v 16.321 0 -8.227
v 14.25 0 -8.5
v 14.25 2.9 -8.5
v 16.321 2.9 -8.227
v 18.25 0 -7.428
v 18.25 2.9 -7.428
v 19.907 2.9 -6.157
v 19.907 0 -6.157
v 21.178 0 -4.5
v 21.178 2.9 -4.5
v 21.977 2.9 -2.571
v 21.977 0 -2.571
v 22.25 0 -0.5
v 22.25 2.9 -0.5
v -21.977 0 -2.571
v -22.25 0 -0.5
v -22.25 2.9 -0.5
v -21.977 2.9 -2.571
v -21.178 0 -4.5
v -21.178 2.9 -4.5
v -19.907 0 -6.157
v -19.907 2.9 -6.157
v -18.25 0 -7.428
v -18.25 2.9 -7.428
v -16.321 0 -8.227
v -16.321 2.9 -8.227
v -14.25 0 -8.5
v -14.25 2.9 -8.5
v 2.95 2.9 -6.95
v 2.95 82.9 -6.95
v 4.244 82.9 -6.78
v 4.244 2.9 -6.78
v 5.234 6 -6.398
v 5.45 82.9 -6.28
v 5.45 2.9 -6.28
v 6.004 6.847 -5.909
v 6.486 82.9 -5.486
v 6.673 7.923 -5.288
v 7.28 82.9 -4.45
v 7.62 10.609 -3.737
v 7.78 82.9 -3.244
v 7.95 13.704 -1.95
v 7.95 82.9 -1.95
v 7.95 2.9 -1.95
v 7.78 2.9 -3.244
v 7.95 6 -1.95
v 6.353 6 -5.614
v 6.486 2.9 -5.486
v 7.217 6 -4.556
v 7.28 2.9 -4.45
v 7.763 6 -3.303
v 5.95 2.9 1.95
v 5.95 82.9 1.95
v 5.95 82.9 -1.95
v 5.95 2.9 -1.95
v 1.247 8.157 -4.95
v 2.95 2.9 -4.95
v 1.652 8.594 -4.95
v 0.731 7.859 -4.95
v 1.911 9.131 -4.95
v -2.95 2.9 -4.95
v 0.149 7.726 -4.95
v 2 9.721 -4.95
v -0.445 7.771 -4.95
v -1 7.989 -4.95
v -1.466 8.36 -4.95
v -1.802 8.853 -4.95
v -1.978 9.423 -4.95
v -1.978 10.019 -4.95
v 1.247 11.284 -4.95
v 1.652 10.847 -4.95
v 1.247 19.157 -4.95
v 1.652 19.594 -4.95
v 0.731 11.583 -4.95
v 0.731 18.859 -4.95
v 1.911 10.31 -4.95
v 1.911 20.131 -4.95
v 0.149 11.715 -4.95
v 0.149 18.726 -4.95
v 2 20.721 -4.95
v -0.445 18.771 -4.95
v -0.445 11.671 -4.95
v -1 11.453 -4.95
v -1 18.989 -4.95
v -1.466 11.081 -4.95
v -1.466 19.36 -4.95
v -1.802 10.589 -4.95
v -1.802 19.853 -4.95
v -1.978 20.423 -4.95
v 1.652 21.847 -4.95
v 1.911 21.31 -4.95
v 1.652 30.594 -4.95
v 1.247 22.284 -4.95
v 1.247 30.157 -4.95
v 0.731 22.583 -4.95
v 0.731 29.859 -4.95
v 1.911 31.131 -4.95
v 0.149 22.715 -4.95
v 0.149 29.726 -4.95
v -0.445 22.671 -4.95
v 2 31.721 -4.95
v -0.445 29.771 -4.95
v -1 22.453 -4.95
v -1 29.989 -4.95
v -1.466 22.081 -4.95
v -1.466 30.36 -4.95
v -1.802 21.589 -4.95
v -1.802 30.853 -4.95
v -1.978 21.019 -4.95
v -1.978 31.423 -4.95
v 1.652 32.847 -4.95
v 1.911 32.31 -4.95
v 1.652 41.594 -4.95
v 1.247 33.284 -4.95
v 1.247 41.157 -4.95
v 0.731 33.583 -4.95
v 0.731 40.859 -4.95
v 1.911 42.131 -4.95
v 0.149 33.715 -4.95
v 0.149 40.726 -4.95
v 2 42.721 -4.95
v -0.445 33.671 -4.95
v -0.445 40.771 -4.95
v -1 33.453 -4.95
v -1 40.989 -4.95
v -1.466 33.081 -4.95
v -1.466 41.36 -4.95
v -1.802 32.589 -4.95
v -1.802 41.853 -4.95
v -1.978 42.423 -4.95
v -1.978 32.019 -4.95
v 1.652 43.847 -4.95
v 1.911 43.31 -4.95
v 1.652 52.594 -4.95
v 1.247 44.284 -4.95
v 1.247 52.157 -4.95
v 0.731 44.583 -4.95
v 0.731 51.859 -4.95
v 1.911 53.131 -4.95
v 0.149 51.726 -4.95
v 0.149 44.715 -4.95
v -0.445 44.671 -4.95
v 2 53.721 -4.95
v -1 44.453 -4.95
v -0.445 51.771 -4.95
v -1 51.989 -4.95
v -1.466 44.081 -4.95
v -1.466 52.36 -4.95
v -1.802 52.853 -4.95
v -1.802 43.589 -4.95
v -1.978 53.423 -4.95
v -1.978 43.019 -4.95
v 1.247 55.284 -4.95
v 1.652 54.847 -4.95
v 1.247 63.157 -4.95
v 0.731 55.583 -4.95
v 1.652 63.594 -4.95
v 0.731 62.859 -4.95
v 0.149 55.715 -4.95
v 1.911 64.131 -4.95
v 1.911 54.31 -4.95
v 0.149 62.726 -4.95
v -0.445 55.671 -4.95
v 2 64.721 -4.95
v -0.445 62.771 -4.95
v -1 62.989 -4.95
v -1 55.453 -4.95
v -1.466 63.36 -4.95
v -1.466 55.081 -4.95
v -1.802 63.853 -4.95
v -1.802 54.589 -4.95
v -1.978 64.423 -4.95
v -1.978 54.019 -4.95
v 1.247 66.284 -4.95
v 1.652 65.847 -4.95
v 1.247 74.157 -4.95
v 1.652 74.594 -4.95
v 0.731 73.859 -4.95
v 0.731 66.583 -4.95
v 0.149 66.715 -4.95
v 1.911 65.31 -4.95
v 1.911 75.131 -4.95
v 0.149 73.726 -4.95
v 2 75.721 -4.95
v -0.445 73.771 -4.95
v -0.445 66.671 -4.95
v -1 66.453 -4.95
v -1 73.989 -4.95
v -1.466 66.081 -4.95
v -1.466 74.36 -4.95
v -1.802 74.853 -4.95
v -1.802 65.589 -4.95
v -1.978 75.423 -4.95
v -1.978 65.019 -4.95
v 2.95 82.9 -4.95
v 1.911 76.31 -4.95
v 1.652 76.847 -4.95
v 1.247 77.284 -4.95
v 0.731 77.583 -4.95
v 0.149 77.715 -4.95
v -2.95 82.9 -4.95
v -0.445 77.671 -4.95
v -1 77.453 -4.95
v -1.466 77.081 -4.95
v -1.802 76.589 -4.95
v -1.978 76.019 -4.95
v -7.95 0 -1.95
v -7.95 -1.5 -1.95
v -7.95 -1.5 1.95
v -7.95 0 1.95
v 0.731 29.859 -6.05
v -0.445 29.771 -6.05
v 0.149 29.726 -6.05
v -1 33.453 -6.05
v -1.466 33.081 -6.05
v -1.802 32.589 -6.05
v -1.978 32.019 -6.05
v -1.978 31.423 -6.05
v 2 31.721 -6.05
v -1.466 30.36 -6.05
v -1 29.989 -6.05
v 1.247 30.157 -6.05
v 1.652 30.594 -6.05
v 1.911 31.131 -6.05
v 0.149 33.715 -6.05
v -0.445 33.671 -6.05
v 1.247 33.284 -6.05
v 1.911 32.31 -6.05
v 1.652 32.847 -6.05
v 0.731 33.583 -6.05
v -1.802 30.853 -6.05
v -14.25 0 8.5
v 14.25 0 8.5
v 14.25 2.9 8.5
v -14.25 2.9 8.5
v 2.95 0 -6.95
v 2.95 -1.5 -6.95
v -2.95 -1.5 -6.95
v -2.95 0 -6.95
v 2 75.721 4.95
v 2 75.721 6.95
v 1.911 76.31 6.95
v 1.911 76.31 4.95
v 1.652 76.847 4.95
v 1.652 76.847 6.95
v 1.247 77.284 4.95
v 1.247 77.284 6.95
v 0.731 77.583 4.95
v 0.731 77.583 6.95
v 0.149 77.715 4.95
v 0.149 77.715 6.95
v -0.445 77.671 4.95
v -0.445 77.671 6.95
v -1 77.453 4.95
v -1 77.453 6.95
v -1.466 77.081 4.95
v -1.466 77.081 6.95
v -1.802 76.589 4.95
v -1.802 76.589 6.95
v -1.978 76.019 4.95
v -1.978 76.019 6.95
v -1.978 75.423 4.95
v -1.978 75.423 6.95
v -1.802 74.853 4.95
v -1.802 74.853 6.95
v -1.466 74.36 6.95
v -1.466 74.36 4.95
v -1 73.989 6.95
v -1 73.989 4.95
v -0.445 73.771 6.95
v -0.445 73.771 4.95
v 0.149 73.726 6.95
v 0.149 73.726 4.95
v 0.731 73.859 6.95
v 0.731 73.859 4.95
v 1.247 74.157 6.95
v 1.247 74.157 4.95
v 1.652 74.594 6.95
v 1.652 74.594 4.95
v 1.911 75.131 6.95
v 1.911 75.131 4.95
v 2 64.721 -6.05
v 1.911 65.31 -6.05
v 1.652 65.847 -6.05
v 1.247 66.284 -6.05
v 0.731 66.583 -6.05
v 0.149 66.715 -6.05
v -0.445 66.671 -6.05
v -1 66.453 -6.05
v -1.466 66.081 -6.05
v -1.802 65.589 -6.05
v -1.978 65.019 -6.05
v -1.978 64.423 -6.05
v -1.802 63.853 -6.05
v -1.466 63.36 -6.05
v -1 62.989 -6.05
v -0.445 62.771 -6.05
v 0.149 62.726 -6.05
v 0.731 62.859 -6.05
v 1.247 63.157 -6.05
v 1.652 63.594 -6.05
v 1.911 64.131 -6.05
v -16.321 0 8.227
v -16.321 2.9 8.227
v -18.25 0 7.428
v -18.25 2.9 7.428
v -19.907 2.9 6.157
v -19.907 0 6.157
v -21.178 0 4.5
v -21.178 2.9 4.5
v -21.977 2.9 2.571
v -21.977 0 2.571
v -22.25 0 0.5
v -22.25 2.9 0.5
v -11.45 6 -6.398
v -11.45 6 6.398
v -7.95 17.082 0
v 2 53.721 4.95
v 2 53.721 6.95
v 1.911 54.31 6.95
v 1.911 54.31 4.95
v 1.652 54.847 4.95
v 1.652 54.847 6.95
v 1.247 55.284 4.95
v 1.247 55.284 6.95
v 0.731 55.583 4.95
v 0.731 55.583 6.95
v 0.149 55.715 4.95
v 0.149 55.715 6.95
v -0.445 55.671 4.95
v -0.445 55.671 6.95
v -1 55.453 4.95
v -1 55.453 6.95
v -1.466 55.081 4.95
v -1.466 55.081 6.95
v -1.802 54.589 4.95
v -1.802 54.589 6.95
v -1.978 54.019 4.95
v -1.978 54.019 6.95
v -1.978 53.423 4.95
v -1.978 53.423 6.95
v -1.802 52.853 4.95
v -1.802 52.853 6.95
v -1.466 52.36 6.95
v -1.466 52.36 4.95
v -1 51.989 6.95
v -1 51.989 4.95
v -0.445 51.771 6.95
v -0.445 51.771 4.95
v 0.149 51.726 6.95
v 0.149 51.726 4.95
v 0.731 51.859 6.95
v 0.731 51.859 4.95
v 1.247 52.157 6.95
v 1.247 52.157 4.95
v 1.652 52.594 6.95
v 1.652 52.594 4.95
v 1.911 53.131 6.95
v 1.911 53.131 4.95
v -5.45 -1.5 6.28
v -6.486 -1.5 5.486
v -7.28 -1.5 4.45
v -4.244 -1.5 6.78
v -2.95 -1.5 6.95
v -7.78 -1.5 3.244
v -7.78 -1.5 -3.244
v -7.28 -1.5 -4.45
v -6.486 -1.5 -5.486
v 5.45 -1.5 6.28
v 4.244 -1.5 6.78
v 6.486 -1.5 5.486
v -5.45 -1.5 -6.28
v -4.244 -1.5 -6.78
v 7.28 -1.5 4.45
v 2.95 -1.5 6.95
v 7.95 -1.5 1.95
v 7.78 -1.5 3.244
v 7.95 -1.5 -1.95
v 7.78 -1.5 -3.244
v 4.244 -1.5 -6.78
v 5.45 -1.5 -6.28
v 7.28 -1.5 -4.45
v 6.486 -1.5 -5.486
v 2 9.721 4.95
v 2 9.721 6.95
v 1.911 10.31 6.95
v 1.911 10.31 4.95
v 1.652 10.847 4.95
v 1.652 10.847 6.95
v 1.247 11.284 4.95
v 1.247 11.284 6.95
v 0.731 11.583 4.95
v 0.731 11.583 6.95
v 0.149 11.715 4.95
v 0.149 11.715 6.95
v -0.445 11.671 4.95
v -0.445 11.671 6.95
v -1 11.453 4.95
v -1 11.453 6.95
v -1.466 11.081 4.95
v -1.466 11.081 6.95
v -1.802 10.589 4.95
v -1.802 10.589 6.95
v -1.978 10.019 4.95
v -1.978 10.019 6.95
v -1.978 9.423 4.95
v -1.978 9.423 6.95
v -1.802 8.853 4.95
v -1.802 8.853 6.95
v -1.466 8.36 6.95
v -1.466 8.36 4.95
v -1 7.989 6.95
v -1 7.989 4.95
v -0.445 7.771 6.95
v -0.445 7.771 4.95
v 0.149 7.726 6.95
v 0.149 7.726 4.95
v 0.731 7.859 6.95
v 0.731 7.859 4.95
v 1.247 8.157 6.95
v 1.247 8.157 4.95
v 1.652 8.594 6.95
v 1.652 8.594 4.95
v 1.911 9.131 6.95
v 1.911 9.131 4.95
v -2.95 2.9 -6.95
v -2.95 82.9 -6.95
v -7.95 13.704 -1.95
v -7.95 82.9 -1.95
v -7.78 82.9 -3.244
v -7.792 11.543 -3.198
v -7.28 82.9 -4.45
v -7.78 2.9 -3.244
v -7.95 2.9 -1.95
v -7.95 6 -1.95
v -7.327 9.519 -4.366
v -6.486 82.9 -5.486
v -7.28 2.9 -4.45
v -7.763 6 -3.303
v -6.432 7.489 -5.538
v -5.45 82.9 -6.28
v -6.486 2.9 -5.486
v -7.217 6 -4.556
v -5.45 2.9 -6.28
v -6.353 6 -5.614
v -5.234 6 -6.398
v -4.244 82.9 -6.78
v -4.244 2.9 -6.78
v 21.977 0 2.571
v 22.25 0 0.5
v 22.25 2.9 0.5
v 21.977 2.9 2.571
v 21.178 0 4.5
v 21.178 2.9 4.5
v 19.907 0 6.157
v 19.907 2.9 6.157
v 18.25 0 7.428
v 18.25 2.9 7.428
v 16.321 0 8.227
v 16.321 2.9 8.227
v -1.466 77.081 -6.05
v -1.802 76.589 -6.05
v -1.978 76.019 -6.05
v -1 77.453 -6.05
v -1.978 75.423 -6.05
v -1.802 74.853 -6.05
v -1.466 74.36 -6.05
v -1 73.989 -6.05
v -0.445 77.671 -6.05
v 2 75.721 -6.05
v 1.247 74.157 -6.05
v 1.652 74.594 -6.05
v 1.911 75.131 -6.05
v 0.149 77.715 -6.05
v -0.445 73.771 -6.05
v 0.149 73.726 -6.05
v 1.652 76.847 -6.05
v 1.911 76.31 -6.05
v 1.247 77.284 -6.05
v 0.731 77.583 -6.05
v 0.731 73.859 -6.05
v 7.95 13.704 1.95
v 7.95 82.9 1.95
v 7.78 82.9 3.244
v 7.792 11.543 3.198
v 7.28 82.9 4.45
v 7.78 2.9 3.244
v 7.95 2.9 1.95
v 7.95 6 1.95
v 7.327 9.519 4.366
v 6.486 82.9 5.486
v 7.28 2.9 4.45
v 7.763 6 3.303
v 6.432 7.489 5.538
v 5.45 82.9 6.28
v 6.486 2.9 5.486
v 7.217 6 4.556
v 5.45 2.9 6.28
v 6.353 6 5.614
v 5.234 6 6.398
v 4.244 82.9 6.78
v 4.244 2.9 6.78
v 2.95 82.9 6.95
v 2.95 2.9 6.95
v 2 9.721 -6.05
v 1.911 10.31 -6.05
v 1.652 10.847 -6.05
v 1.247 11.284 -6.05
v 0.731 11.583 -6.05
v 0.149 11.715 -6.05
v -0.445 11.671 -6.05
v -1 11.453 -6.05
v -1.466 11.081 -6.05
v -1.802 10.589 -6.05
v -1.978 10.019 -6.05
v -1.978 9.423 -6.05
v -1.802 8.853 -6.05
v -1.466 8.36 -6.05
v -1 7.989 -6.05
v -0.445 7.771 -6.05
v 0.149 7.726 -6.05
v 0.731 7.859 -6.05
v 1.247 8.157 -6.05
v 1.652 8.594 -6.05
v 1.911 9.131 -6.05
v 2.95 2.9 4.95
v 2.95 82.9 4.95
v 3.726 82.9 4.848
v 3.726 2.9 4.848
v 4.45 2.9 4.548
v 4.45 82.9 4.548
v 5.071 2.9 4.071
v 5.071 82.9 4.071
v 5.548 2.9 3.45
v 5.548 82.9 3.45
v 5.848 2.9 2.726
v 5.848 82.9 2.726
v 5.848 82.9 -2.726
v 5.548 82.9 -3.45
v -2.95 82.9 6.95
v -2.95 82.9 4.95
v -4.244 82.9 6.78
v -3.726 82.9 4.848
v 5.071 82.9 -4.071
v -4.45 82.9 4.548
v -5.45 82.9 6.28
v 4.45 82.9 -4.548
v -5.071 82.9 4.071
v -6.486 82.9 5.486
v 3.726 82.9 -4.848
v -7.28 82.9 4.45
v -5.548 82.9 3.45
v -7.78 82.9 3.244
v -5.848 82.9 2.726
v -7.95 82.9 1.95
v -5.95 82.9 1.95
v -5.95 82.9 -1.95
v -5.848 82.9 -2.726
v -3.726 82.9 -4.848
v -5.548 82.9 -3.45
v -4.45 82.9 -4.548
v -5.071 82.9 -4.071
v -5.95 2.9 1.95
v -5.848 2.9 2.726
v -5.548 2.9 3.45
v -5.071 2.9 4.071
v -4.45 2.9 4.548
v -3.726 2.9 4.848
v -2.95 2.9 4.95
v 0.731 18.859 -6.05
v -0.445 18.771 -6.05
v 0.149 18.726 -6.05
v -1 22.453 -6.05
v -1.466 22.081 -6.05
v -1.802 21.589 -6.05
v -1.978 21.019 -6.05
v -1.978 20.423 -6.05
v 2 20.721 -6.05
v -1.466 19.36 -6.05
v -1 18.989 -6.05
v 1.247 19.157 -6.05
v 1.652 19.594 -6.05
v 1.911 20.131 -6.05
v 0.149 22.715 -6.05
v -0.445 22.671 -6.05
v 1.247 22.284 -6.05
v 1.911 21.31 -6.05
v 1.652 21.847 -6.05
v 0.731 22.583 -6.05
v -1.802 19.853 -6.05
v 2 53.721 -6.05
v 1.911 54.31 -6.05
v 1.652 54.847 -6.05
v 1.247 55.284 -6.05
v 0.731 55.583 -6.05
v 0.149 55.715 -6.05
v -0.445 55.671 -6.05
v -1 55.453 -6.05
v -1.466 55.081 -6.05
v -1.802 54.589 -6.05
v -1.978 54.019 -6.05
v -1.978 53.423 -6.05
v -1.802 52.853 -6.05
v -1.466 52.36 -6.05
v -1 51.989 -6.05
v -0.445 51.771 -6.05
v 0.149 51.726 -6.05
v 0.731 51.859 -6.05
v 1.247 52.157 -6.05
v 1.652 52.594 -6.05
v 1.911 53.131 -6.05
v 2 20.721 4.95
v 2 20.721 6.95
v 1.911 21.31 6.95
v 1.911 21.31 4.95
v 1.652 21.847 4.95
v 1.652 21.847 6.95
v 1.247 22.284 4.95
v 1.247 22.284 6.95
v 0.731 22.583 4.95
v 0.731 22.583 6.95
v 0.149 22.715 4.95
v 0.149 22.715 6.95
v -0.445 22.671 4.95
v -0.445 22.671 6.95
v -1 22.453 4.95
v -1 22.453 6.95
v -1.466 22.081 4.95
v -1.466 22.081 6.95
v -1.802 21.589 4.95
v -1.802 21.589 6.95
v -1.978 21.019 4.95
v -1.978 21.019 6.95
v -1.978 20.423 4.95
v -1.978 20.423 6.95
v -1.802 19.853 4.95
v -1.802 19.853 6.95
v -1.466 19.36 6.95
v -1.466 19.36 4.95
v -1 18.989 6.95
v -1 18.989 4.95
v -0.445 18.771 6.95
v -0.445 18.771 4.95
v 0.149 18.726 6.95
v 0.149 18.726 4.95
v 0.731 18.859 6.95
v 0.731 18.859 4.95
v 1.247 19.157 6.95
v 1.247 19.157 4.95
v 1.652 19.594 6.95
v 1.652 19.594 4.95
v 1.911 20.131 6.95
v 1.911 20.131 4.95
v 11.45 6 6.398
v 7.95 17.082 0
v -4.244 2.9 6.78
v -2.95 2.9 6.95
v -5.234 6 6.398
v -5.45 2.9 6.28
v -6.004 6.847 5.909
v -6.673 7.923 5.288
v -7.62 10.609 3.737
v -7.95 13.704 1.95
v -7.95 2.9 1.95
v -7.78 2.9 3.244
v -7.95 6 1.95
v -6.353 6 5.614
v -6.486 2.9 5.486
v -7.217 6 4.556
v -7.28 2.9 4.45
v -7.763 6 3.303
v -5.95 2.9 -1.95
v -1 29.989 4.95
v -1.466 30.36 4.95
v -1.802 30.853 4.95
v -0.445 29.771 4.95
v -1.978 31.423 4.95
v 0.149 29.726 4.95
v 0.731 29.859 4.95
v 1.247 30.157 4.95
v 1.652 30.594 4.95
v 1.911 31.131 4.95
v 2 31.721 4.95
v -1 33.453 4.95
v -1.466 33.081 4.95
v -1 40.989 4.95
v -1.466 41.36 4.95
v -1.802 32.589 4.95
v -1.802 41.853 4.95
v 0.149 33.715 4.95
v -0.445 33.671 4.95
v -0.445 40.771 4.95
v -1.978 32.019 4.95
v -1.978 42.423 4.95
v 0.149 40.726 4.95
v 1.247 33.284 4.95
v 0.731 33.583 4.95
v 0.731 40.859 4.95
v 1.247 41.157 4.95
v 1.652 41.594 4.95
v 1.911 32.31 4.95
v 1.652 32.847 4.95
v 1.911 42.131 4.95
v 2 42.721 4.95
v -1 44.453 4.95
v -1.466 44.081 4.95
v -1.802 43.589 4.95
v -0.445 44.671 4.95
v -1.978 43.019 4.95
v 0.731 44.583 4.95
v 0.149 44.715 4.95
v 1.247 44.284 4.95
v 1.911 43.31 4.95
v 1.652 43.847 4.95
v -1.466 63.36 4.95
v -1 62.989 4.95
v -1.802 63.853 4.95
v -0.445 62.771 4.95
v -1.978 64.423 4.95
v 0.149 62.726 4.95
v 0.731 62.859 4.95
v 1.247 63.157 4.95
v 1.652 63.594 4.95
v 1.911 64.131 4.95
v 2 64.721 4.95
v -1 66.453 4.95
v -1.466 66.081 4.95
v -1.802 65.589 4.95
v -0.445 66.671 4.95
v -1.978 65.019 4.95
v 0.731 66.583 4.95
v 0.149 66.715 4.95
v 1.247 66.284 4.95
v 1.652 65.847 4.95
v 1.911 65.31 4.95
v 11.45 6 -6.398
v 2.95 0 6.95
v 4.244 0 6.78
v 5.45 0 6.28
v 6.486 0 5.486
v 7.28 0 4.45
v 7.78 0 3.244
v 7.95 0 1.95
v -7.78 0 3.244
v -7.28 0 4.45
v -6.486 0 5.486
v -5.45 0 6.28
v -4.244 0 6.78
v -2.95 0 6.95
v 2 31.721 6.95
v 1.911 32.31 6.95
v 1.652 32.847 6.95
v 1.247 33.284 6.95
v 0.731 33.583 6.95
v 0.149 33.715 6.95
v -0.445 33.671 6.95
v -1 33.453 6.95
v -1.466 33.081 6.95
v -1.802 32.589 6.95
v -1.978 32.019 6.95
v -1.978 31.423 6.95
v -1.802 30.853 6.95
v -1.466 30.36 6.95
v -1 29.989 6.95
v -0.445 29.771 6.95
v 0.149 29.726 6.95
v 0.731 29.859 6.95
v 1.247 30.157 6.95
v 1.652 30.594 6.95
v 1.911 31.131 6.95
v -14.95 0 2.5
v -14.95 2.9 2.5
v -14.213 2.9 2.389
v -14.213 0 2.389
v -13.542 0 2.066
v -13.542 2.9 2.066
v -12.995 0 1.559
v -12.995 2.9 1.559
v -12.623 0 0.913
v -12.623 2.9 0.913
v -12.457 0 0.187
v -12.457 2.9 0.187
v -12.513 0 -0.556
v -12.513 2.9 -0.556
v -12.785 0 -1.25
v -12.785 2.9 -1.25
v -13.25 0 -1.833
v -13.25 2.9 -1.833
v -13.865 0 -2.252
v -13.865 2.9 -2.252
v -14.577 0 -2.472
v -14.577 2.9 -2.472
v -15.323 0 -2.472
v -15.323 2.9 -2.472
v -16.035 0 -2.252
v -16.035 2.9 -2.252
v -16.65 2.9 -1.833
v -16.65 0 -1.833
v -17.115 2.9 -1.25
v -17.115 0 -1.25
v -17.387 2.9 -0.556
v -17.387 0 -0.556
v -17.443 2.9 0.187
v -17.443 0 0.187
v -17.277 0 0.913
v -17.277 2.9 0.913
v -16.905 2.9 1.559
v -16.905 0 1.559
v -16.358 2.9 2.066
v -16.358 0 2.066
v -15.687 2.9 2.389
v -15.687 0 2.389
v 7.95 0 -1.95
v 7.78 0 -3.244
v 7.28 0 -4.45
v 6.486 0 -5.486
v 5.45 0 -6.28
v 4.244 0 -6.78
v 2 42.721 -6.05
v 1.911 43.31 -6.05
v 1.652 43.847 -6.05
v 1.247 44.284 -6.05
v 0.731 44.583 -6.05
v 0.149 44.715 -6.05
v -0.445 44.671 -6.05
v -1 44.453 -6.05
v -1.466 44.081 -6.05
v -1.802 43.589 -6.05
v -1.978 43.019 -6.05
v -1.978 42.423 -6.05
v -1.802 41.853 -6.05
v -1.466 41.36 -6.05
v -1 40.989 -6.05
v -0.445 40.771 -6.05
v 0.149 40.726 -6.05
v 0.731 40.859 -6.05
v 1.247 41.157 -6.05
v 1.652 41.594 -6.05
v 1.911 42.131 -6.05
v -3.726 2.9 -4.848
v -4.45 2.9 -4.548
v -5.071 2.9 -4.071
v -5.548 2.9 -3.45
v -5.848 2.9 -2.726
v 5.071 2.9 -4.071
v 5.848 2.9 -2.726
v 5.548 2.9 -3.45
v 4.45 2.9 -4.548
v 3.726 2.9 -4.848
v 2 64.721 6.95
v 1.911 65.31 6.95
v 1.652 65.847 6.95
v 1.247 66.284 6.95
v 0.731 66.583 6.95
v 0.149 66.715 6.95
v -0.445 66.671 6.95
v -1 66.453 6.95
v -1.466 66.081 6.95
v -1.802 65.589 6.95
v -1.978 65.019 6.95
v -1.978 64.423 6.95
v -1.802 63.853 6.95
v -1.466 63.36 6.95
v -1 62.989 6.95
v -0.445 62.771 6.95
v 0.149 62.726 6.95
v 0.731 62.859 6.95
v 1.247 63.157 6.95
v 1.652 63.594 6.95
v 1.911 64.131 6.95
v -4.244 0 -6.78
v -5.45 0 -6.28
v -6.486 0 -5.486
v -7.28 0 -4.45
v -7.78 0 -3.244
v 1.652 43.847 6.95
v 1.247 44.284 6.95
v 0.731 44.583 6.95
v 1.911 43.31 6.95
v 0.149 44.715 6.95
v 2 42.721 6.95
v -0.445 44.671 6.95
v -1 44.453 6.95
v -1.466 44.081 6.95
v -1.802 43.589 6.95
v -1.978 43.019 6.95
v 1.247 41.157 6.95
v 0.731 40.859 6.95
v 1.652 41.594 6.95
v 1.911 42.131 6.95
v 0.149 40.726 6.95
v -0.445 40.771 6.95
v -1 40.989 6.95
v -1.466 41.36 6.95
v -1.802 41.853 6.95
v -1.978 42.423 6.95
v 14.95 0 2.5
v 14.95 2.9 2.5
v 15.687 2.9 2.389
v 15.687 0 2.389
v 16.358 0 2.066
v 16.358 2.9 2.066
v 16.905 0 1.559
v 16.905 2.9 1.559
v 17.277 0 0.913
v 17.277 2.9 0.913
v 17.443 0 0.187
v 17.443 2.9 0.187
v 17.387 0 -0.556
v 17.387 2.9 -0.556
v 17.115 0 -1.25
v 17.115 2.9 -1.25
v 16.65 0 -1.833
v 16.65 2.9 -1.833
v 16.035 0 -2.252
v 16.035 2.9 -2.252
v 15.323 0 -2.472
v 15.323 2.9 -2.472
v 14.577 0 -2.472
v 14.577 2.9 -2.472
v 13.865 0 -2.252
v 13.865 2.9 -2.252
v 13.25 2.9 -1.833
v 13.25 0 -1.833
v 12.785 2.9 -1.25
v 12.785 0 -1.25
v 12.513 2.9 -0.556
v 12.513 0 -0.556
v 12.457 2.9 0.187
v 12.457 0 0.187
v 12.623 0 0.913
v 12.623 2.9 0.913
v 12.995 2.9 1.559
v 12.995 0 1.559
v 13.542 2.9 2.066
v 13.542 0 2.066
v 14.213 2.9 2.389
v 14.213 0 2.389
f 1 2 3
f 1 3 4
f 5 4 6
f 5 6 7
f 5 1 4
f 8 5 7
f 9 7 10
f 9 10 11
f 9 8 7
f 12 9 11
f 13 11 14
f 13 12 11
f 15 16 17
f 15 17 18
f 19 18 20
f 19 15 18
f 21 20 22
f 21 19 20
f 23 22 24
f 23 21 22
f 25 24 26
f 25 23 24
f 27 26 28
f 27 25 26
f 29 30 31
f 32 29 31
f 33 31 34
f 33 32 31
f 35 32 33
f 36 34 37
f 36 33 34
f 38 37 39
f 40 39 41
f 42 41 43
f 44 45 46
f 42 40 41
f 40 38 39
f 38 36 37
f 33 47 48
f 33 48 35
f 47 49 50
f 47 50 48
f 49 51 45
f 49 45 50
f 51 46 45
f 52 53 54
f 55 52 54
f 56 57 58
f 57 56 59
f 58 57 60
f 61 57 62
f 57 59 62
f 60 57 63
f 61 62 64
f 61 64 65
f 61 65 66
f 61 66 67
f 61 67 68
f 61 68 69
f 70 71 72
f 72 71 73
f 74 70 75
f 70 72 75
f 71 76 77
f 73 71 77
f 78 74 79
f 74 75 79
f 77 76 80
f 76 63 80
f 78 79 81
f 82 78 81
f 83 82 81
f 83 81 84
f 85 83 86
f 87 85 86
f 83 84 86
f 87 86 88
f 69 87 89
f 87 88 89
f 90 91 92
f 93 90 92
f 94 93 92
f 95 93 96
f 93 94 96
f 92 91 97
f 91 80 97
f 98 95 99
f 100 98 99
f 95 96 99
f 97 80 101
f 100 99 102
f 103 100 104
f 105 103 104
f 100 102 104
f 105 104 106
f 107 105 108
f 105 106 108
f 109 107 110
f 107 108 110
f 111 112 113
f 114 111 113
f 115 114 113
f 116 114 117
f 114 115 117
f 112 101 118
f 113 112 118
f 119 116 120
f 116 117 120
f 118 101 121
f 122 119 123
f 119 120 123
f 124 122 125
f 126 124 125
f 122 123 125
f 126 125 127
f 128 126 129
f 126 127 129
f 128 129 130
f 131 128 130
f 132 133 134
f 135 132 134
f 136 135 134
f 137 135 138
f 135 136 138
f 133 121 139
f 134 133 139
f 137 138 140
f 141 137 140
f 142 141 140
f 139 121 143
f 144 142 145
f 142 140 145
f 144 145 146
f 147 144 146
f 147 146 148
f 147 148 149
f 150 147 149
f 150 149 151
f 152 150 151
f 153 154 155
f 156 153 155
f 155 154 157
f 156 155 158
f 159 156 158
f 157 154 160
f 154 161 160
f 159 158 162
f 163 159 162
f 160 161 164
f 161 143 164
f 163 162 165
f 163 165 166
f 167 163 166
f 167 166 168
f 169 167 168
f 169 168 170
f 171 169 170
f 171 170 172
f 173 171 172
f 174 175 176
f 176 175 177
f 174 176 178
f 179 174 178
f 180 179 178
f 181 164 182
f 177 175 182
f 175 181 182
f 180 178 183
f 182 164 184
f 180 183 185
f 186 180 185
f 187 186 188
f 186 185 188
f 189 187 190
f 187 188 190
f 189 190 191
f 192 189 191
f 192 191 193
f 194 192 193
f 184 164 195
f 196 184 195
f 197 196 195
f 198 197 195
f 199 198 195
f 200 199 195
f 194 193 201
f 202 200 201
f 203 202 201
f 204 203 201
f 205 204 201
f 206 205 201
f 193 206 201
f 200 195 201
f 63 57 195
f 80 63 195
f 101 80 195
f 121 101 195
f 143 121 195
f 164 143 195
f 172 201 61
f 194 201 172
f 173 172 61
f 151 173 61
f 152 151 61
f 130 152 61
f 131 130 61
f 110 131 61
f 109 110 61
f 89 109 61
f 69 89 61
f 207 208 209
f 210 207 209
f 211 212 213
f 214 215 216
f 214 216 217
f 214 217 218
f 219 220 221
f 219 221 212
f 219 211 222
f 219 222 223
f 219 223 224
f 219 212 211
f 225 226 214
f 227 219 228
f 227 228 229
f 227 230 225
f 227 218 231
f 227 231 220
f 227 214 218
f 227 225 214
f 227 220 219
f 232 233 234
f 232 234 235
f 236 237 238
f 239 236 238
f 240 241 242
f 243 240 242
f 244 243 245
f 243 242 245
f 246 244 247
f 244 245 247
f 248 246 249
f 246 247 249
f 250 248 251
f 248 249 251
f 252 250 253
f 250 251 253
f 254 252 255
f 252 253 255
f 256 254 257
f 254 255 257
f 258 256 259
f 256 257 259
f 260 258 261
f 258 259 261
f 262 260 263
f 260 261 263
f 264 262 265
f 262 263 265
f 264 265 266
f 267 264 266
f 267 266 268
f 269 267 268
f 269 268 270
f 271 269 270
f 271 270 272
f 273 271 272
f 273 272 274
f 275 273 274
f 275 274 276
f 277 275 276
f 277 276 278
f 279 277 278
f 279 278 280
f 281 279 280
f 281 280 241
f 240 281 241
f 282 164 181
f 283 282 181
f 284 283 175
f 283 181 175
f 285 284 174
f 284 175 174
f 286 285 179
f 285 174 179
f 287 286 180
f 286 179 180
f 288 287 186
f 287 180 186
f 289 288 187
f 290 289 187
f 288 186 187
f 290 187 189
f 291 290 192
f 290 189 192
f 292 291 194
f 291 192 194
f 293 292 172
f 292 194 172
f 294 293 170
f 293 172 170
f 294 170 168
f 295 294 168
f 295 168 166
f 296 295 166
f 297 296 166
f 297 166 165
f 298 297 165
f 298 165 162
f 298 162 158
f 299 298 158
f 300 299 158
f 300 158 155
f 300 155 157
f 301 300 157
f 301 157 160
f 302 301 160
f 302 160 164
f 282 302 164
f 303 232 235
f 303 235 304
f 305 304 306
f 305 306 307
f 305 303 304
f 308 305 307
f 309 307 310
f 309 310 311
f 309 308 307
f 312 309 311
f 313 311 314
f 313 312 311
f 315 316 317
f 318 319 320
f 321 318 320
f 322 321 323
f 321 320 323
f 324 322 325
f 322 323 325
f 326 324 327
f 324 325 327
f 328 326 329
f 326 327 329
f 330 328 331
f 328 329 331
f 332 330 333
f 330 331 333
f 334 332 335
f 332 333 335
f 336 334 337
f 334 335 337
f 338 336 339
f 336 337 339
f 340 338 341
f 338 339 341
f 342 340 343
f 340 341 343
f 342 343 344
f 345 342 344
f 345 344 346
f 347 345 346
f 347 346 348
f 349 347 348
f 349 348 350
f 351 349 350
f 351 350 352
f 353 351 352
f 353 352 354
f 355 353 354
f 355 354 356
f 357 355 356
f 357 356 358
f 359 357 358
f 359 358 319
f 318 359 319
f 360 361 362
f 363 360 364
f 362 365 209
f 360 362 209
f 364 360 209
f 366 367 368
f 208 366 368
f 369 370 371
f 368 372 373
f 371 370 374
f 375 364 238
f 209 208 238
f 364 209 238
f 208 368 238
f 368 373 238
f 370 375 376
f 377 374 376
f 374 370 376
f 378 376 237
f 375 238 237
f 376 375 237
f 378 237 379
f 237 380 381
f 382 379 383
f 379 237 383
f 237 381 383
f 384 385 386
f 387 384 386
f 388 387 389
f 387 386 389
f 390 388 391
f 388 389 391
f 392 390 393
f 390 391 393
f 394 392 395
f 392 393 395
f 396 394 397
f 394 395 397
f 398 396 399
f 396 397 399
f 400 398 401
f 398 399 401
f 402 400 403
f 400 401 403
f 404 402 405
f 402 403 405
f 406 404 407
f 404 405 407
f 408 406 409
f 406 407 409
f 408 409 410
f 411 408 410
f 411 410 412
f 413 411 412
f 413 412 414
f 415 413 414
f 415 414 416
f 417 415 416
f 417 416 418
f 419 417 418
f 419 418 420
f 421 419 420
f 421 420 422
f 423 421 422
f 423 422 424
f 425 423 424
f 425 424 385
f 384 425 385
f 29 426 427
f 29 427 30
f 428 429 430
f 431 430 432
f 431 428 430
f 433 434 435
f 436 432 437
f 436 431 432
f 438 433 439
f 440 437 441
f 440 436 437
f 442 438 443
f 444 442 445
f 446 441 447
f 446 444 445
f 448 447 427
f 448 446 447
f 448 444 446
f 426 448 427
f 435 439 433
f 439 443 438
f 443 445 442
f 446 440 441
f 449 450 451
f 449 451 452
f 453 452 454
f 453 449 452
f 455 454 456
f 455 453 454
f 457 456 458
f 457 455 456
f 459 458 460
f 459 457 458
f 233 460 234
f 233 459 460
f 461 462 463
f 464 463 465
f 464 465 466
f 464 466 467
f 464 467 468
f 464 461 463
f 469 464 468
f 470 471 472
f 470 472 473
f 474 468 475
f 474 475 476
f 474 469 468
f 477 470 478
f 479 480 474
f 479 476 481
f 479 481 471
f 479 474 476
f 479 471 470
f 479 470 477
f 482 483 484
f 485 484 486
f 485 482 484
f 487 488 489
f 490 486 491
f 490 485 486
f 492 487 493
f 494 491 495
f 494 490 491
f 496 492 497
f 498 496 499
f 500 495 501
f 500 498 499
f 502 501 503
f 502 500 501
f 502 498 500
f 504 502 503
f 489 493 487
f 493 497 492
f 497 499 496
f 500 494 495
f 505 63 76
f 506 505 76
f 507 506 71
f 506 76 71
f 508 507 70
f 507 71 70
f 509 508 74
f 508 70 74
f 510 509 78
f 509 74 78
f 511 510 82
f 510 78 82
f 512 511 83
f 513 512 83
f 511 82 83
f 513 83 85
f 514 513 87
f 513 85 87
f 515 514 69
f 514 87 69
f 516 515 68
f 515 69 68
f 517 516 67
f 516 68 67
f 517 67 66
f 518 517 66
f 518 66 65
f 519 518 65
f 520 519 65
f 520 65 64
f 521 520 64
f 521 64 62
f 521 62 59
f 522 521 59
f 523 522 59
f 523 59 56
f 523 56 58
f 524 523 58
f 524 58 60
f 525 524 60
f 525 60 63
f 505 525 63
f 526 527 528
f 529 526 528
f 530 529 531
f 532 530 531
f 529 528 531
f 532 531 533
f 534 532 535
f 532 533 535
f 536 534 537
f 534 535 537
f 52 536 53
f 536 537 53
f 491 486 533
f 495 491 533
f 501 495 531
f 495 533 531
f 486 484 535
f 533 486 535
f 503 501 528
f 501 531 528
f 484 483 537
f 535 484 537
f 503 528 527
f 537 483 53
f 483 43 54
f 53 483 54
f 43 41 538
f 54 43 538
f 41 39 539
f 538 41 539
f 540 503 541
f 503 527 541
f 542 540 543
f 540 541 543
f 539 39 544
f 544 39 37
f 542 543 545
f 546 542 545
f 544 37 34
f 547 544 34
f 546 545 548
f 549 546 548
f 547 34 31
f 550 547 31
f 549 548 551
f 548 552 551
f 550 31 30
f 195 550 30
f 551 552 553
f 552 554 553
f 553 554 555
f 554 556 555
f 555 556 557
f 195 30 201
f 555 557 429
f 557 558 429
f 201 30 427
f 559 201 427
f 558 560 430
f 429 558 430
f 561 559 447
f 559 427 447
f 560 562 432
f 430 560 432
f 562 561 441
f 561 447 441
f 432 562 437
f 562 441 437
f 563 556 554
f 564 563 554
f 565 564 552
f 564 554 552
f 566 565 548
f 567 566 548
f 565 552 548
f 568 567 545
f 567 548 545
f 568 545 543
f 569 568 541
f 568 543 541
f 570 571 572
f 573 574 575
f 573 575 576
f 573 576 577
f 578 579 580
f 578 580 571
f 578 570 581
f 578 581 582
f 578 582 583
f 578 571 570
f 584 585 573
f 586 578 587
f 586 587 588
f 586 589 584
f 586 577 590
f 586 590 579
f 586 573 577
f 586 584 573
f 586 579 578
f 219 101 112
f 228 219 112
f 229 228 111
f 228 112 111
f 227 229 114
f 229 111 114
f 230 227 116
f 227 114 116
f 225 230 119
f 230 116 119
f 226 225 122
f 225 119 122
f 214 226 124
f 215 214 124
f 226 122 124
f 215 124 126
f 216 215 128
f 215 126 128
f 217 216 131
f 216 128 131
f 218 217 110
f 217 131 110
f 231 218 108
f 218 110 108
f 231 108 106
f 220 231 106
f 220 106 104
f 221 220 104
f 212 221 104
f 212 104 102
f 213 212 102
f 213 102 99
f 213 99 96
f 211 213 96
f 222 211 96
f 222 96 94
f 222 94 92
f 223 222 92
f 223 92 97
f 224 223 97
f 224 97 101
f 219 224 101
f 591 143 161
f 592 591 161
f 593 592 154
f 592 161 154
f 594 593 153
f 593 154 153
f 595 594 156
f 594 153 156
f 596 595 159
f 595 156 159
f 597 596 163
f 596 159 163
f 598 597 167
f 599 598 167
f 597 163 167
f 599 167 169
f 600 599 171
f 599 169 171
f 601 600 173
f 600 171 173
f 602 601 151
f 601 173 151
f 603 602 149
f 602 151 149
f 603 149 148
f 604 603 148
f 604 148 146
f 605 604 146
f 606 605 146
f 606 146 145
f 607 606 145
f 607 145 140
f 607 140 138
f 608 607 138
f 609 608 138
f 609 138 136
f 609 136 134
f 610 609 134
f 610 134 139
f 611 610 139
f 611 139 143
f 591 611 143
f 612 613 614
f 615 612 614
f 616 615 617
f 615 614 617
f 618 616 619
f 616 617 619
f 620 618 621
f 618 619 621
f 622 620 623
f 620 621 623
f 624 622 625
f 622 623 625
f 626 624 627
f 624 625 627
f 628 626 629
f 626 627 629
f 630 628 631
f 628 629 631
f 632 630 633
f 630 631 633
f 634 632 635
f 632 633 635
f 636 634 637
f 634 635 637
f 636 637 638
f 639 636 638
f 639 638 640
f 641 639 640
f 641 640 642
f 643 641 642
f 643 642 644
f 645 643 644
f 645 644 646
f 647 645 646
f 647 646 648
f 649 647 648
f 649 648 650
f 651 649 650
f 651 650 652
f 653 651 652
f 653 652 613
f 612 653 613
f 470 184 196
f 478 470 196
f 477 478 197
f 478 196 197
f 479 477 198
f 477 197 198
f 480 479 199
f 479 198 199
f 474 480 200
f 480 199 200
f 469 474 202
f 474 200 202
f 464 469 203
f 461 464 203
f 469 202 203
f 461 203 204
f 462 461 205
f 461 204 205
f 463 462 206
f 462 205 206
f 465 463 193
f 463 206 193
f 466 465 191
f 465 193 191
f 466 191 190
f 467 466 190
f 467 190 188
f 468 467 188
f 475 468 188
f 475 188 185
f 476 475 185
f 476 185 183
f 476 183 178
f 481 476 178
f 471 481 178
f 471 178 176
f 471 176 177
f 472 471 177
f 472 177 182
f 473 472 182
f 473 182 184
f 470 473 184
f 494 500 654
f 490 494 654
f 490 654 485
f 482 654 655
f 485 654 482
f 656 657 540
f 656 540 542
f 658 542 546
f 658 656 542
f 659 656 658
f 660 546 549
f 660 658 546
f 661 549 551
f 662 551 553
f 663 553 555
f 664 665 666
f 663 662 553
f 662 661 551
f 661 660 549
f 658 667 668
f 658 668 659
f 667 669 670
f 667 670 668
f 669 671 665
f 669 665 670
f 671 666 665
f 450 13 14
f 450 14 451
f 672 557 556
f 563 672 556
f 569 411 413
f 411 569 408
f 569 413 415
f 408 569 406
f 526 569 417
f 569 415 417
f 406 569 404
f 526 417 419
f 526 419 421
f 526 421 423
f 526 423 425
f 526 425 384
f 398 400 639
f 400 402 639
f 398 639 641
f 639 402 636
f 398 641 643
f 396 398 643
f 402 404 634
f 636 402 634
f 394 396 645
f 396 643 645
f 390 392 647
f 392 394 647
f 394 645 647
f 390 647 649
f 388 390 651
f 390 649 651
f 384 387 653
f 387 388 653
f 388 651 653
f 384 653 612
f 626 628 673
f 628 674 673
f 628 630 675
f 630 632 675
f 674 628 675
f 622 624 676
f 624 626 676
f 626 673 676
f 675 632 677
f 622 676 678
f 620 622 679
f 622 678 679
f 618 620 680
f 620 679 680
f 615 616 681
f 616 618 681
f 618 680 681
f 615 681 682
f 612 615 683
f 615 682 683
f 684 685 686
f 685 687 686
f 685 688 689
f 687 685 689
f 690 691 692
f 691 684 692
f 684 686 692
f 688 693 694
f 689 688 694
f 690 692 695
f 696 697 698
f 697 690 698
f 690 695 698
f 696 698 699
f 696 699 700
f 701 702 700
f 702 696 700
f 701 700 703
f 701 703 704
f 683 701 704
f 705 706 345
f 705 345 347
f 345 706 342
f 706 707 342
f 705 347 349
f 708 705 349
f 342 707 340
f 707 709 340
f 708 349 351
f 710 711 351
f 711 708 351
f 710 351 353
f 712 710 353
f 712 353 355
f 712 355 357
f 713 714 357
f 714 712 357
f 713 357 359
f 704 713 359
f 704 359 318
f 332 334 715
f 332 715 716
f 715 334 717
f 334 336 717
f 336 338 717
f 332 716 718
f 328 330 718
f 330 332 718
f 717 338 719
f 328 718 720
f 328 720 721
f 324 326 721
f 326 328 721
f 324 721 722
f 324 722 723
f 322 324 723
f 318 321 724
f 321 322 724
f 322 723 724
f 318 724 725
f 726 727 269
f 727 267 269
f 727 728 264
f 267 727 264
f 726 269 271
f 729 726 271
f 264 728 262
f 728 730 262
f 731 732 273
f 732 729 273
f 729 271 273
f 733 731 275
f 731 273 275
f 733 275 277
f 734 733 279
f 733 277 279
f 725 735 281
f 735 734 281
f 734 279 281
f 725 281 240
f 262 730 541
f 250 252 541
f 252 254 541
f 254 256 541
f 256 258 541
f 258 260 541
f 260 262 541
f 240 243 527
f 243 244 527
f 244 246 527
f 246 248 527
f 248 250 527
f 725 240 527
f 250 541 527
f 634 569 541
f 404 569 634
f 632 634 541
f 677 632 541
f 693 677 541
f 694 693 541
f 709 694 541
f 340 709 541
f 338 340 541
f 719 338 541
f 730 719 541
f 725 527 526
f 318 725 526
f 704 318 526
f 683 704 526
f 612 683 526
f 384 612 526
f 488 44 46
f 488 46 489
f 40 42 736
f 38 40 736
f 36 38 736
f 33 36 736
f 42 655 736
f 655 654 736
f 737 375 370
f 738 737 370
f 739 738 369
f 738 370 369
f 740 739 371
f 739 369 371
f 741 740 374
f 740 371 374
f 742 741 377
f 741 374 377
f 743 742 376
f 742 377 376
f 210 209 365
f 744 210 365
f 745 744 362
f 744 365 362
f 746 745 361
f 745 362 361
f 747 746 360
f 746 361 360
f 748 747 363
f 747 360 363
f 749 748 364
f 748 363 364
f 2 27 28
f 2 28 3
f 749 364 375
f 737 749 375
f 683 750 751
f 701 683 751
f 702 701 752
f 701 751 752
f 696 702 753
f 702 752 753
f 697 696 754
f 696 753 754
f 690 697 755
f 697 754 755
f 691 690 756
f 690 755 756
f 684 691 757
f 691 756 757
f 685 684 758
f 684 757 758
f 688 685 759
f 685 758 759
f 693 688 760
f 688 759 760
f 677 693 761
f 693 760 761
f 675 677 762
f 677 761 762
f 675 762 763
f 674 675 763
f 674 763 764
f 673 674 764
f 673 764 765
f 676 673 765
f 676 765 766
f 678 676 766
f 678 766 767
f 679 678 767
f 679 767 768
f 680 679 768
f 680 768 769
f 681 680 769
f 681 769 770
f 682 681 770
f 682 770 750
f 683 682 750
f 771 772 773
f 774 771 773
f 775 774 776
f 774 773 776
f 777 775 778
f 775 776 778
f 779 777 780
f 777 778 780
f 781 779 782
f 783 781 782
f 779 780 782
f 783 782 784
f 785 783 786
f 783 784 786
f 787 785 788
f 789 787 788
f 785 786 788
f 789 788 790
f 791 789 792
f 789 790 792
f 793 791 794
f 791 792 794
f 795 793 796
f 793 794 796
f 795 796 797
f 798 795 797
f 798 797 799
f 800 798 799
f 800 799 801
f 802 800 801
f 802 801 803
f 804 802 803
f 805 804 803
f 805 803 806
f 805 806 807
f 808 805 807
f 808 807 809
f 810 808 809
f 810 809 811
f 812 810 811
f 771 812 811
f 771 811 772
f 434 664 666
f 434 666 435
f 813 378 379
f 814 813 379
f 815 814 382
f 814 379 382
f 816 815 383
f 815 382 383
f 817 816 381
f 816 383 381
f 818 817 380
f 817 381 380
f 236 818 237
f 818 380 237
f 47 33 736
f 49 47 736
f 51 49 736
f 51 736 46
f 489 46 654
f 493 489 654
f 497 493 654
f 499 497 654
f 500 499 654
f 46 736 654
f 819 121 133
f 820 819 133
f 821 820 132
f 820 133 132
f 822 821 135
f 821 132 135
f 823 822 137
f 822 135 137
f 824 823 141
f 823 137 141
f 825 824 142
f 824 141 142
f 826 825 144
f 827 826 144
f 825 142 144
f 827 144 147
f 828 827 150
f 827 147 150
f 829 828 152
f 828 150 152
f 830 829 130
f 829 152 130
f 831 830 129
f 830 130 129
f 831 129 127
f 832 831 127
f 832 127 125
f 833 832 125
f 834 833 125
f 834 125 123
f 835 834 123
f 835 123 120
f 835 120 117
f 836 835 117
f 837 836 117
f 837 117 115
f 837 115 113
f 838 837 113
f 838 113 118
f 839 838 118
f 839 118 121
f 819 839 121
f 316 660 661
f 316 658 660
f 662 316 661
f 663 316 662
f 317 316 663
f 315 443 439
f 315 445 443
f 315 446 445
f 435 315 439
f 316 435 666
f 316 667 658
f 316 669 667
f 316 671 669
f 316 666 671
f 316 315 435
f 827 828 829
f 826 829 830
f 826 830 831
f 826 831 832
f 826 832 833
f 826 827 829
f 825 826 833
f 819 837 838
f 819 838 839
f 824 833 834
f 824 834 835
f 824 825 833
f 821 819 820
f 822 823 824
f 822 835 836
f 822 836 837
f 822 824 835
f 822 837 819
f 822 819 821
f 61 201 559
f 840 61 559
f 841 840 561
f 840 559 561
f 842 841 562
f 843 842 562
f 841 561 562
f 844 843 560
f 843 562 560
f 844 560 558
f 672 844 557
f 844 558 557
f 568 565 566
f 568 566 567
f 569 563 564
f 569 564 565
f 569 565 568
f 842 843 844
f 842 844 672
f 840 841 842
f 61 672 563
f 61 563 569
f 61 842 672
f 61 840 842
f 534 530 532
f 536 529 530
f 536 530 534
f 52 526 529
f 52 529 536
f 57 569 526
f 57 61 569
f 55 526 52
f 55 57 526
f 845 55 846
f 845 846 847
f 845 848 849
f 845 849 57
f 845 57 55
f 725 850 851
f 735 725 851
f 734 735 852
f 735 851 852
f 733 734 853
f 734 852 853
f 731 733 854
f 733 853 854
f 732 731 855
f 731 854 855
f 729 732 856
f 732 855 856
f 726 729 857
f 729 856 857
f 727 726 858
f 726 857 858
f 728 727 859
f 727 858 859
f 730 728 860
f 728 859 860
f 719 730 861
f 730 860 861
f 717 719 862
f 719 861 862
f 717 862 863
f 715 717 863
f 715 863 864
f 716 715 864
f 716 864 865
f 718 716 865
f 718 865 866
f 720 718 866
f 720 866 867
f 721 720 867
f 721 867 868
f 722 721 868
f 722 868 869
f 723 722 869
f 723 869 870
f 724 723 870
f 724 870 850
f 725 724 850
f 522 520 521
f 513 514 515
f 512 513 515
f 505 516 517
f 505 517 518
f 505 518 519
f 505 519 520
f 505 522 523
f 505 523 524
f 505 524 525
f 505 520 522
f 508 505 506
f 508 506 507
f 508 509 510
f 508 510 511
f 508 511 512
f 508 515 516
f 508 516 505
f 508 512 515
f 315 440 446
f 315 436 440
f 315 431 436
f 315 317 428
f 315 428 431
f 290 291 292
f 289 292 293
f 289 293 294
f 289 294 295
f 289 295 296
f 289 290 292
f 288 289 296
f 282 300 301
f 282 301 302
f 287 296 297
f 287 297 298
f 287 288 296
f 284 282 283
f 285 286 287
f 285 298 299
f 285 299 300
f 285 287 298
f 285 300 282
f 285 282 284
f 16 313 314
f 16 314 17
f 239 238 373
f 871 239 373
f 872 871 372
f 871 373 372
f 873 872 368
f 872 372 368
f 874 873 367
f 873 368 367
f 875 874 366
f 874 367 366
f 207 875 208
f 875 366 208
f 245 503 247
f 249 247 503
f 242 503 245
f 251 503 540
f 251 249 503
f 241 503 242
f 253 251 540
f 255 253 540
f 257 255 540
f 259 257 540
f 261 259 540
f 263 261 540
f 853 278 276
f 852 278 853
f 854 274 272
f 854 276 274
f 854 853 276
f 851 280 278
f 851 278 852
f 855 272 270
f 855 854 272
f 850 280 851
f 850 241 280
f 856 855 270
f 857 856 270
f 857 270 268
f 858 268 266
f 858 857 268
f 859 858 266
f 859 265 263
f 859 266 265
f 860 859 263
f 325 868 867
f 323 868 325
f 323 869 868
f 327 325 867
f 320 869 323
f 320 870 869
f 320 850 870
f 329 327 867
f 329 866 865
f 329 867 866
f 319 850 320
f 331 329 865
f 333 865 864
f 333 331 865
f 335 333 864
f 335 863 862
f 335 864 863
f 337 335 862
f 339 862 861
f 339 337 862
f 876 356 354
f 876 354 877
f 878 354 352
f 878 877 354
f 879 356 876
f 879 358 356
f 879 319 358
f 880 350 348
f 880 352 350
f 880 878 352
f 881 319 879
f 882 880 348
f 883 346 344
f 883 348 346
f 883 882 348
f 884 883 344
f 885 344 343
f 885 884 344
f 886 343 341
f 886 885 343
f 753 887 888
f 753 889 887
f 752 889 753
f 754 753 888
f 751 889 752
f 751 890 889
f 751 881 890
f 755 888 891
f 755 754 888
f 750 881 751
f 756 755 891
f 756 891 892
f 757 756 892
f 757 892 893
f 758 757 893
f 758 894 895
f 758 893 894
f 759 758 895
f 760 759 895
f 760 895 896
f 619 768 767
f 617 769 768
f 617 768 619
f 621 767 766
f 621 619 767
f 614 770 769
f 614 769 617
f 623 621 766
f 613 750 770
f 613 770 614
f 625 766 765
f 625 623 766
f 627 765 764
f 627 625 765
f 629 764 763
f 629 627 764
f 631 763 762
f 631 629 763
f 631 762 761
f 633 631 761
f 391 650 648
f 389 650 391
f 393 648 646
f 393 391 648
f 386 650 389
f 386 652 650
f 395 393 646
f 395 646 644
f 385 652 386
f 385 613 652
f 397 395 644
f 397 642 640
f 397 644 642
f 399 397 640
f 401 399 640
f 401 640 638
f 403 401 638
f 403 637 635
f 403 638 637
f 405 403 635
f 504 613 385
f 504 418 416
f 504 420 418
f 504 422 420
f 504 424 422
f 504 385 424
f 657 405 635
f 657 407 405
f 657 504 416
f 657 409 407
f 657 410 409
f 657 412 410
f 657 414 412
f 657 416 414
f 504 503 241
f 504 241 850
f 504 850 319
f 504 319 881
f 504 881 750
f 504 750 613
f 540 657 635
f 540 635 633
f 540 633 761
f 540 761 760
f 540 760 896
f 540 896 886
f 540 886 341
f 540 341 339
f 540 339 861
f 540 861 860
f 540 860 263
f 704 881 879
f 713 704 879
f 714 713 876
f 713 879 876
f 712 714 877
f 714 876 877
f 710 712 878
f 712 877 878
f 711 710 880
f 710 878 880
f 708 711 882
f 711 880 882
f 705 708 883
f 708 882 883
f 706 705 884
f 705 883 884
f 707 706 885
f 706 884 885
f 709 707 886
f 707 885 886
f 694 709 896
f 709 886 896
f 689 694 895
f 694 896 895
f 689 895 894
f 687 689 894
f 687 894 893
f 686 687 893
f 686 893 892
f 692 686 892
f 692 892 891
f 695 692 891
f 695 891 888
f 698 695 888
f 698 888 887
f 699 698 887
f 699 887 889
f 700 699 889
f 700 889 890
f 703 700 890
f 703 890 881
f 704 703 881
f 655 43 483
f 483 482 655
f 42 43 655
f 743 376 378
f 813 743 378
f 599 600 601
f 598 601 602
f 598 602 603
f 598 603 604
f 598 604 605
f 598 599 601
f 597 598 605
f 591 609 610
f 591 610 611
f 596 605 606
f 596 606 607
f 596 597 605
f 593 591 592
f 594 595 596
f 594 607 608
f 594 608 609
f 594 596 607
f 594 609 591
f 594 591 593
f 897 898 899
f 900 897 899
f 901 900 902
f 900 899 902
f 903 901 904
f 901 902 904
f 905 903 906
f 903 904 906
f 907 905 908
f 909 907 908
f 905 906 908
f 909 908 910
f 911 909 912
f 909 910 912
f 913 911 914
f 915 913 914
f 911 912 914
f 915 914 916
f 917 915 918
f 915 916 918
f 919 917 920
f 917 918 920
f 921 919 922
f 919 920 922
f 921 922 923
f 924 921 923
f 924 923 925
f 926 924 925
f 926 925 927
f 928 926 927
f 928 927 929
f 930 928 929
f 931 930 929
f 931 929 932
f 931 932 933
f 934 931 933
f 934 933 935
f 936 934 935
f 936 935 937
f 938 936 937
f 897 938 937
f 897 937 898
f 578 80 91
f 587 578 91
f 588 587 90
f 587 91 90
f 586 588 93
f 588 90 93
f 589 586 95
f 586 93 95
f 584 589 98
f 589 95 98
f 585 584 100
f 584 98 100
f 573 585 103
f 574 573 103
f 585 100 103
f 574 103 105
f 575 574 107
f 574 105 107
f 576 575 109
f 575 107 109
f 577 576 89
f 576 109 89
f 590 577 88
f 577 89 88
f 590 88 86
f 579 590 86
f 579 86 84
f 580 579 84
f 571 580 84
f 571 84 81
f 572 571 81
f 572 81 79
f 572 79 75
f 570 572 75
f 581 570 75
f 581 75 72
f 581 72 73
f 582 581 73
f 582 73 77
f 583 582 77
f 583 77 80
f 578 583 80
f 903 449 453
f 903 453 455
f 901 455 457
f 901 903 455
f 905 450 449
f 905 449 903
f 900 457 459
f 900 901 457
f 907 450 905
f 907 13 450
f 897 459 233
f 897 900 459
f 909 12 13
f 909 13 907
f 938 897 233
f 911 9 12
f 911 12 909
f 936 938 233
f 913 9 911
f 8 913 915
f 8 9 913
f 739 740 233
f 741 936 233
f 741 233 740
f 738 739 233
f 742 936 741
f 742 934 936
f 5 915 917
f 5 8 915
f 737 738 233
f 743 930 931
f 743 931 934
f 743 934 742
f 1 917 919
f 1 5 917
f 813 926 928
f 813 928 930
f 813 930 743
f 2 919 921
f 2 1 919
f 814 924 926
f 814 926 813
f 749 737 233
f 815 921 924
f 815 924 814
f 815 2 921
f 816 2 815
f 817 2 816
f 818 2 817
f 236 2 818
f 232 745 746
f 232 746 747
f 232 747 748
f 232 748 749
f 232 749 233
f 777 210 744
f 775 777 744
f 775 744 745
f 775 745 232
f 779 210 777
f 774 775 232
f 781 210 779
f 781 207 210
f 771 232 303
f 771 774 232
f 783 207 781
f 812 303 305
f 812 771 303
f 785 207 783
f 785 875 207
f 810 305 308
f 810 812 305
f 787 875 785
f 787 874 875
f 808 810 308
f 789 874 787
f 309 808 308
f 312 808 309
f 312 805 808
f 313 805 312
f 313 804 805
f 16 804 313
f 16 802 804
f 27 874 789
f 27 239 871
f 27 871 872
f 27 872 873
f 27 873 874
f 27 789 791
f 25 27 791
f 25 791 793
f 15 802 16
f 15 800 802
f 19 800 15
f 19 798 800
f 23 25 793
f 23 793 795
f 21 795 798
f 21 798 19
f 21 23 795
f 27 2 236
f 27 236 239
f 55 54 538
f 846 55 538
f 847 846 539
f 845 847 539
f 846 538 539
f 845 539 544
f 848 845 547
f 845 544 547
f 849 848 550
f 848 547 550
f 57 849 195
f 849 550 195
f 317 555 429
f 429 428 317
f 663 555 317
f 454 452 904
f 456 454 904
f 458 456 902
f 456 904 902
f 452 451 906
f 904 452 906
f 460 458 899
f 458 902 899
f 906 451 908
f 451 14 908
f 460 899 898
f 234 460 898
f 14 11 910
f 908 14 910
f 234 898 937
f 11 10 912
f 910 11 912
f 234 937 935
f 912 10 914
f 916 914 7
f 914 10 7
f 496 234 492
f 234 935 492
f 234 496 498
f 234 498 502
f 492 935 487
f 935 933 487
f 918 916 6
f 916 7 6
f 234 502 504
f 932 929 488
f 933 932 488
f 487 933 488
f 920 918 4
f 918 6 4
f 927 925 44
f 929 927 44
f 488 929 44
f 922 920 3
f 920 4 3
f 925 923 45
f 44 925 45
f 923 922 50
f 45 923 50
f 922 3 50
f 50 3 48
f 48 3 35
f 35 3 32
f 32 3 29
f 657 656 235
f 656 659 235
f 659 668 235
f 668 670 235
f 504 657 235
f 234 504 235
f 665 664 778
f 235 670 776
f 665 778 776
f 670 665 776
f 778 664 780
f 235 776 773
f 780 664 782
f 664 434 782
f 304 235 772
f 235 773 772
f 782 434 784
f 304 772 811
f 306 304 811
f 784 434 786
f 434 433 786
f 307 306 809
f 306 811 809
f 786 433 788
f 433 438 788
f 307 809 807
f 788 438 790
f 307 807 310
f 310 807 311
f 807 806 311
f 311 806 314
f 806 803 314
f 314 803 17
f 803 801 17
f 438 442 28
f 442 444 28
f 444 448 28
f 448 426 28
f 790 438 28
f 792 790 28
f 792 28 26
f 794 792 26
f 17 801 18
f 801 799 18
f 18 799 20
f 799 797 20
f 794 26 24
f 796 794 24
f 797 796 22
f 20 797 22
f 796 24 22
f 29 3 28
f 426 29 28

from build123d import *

# Parameters (mm, degrees)
EXTRUDE_1_DEPTH     = 2.9
EXTRUDE_2_DEPTH     = 80
CUT_EXTRUDE_1_DEPTH = 80
SKETCH_5_R          = 2.5
CUT_EXTRUDE_2_DEPTH = 80
EXTRUDE_START       = 1.5
EXTRUDE_3_DEPTH     = 1.5
SKETCH_8_R          = 2
CUT_EXTRUDE_3_DEPTH = 13
EXTRUDE_4_DEPTH     = 3.5
CUT_EXTRUDE_4_DEPTH = 50
CUT_EXTRUDE_5_DEPTH = 80


with BuildPart() as part:
    # 草图1 → 凸台-拉伸1 (new body)
    with BuildSketch(Plane(origin=(0, 0, 0), x_dir=(1, 0, 0), z_dir=(0, 1, 0))):
        with BuildLine():
            Line((-14.25, 8.5), (14.25, 8.5))
            ThreePointArc((14.25, 8.5), (19.906854249, 6.156854249), (22.25, 0.5))
            Line((22.25, 0.5), (22.25, -0.5))
            ThreePointArc((22.25, -0.5), (19.906854249, -6.156854249), (14.25, -8.5))
            Line((14.25, -8.5), (-14.25, -8.5))
            ThreePointArc((-14.25, -8.5), (-19.906854249, -6.156854249), (-22.25, -0.5))
            Line((-22.25, -0.5), (-22.25, 0.5))
            ThreePointArc((-22.25, 0.5), (-19.906854249, 6.156854249), (-14.25, 8.5))
        make_face()
    extrude(amount=EXTRUDE_1_DEPTH)

    # 草图3 → 凸台-拉伸2 (add)
    with BuildSketch(Plane(origin=(0, 2.9, 0), x_dir=(1, 0, 0), z_dir=(0, 1, 0))):
        with BuildLine():
            Line((-2.95, 6.95), (2.95, 6.95))
            ThreePointArc((2.95, 6.95), (6.485533906, 5.485533906), (7.95, 1.95))
            Line((7.95, 1.95), (7.95, -1.95))
            ThreePointArc((7.95, -1.95), (6.485533906, -5.485533906), (2.95, -6.95))
            Line((2.95, -6.95), (-2.95, -6.95))
            ThreePointArc((-2.95, -6.95), (-6.485533906, -5.485533906), (-7.95, -1.95))
            Line((-7.95, -1.95), (-7.95, 1.95))
            ThreePointArc((-7.95, 1.95), (-6.485533906, 5.485533906), (-2.95, 6.95))
        make_face()
    extrude(amount=EXTRUDE_2_DEPTH)

    # 草图4 → 切除-拉伸1 (cut)
    with BuildSketch(Plane(origin=(0, 82.9, 0), x_dir=(1, 0, 0), z_dir=(0, 1, 0))):
        with BuildLine():
            Line((5.95, -1.95), (5.95, 1.95))
            ThreePointArc((5.95, 1.95), (5.071320344, 4.071320344), (2.95, 4.95))
            Line((2.95, 4.95), (-2.95, 4.95))
            ThreePointArc((-2.95, 4.95), (-5.071320344, 4.071320344), (-5.95, 1.95))
            Line((-5.95, 1.95), (-5.95, -1.95))
            ThreePointArc((-5.95, -1.95), (-5.071320344, -4.071320344), (-2.95, -4.95))
            Line((-2.95, -4.95), (2.95, -4.95))
            ThreePointArc((2.95, -4.95), (5.071320344, -4.071320344), (5.95, -1.95))
        make_face()
    extrude(amount=-CUT_EXTRUDE_1_DEPTH, mode=Mode.SUBTRACT)

    # 草图5 → 切除-拉伸2 (cut)
    with BuildSketch(Plane(origin=(0, 2.9, 0), x_dir=(1, 0, 0), z_dir=(0, 1, 0))):
        with Locations(Location((-14.95, 0, 0), (0, 0, 270))):
            Circle(SKETCH_5_R)
        with Locations(Location((14.95, 0, 0), (0, 0, 270))):
            Circle(SKETCH_5_R)
    extrude(amount=-CUT_EXTRUDE_2_DEPTH, mode=Mode.SUBTRACT)

    # 草图7 → 凸台-拉伸3 (add)
    with BuildSketch(Plane(origin=(0, 0, 0), x_dir=(-1, 0, 0), z_dir=(0, -1, 0)).offset(EXTRUDE_START)):
        with BuildLine():
            Line((2.95, -6.95), (-2.95, -6.95))
            ThreePointArc((-2.95, -6.95), (-6.485533906, -5.485533906), (-7.95, -1.95))
            Line((-7.95, -1.95), (-7.95, 1.95))
            ThreePointArc((-7.95, 1.95), (-6.485533906, 5.485533906), (-2.95, 6.95))
            Line((-2.95, 6.95), (2.95, 6.95))
            ThreePointArc((2.95, 6.95), (6.485533906, 5.485533906), (7.95, 1.95))
            Line((7.95, 1.95), (7.95, -1.95))
            ThreePointArc((7.95, -1.95), (6.485533906, -5.485533906), (2.95, -6.95))
        make_face()
    extrude(amount=-EXTRUDE_3_DEPTH)

    # 草图8 → 切除-拉伸3 (cut)
    with BuildSketch(Plane.XY.offset(6.95)):
        with Locations((0, 75.720823604)):
            Circle(SKETCH_8_R)
        with Locations((0, 64.720823604)):
            Circle(SKETCH_8_R)
        with Locations((0, 53.720823604)):
            Circle(SKETCH_8_R)
        with Locations((0, 42.720823604)):
            Circle(SKETCH_8_R)
        with Locations((0, 31.720823604)):
            Circle(SKETCH_8_R)
        with Locations((0, 20.720823604)):
            Circle(SKETCH_8_R)
        with Locations((0, 9.720823604)):
            Circle(SKETCH_8_R)
    extrude(amount=-CUT_EXTRUDE_3_DEPTH, mode=Mode.SUBTRACT)

    # 草图9 → 凸台-拉伸4 (add, symmetric)
    with BuildSketch(Plane.ZY.offset(7.95)):
        Polygon((0, 17.081538124), (-6.397929019, 6), (6.397929019, 6), align=None)
    extrude_4 = extrude(amount=EXTRUDE_4_DEPTH, both=True)

    # 草图10 → 切除-拉伸4 (cut)
    with BuildSketch(Plane.XY.offset(6.95)):
        Polygon((-11.45, 6), (-7.95, 17.081538124), (-15.556844876, 23.601808742), align=None)
    cut_extrude_4 = extrude(amount=-CUT_EXTRUDE_4_DEPTH, mode=Mode.SUBTRACT)

    # 草图12 → 切除-拉伸5 (cut)
    with BuildSketch(Plane(origin=(0, 82.9, 0), x_dir=(1, 0, 0), z_dir=(0, 1, 0))):
        with BuildLine():
            Line((-2.95, -4.95), (2.95, -4.95))
            ThreePointArc((2.95, -4.95), (5.071320344, -4.071320344), (5.95, -1.95))
            Line((5.95, -1.95), (5.95, 1.95))
            ThreePointArc((5.95, 1.95), (5.071320344, 4.071320344), (2.95, 4.95))
            Line((2.95, 4.95), (-2.95, 4.95))
            ThreePointArc((-2.95, 4.95), (-5.071320344, 4.071320344), (-5.95, 1.95))
            Line((-5.95, 1.95), (-5.95, -1.95))
            ThreePointArc((-5.95, -1.95), (-5.071320344, -4.071320344), (-2.95, -4.95))
        make_face()
    cut_extrude_5 = extrude(amount=-CUT_EXTRUDE_5_DEPTH, mode=Mode.SUBTRACT)

    # 镜向2: 凸台-拉伸4 across plane
    add(extrude_4.mirror(Plane(origin=(0, 0, 0), x_dir=(0, 0, 1), z_dir=(1, 0, 0))))

    # 镜向3: 切除-拉伸4, 切除-拉伸5 across plane
    add(cut_extrude_4.mirror(Plane(origin=(0, 0, 0), x_dir=(0, 0, 1), z_dir=(1, 0, 0))), mode=Mode.SUBTRACT)
    add(cut_extrude_5.mirror(Plane(origin=(0, 0, 0), x_dir=(0, 0, 1), z_dir=(1, 0, 0))), mode=Mode.SUBTRACT)


solid = part.part
